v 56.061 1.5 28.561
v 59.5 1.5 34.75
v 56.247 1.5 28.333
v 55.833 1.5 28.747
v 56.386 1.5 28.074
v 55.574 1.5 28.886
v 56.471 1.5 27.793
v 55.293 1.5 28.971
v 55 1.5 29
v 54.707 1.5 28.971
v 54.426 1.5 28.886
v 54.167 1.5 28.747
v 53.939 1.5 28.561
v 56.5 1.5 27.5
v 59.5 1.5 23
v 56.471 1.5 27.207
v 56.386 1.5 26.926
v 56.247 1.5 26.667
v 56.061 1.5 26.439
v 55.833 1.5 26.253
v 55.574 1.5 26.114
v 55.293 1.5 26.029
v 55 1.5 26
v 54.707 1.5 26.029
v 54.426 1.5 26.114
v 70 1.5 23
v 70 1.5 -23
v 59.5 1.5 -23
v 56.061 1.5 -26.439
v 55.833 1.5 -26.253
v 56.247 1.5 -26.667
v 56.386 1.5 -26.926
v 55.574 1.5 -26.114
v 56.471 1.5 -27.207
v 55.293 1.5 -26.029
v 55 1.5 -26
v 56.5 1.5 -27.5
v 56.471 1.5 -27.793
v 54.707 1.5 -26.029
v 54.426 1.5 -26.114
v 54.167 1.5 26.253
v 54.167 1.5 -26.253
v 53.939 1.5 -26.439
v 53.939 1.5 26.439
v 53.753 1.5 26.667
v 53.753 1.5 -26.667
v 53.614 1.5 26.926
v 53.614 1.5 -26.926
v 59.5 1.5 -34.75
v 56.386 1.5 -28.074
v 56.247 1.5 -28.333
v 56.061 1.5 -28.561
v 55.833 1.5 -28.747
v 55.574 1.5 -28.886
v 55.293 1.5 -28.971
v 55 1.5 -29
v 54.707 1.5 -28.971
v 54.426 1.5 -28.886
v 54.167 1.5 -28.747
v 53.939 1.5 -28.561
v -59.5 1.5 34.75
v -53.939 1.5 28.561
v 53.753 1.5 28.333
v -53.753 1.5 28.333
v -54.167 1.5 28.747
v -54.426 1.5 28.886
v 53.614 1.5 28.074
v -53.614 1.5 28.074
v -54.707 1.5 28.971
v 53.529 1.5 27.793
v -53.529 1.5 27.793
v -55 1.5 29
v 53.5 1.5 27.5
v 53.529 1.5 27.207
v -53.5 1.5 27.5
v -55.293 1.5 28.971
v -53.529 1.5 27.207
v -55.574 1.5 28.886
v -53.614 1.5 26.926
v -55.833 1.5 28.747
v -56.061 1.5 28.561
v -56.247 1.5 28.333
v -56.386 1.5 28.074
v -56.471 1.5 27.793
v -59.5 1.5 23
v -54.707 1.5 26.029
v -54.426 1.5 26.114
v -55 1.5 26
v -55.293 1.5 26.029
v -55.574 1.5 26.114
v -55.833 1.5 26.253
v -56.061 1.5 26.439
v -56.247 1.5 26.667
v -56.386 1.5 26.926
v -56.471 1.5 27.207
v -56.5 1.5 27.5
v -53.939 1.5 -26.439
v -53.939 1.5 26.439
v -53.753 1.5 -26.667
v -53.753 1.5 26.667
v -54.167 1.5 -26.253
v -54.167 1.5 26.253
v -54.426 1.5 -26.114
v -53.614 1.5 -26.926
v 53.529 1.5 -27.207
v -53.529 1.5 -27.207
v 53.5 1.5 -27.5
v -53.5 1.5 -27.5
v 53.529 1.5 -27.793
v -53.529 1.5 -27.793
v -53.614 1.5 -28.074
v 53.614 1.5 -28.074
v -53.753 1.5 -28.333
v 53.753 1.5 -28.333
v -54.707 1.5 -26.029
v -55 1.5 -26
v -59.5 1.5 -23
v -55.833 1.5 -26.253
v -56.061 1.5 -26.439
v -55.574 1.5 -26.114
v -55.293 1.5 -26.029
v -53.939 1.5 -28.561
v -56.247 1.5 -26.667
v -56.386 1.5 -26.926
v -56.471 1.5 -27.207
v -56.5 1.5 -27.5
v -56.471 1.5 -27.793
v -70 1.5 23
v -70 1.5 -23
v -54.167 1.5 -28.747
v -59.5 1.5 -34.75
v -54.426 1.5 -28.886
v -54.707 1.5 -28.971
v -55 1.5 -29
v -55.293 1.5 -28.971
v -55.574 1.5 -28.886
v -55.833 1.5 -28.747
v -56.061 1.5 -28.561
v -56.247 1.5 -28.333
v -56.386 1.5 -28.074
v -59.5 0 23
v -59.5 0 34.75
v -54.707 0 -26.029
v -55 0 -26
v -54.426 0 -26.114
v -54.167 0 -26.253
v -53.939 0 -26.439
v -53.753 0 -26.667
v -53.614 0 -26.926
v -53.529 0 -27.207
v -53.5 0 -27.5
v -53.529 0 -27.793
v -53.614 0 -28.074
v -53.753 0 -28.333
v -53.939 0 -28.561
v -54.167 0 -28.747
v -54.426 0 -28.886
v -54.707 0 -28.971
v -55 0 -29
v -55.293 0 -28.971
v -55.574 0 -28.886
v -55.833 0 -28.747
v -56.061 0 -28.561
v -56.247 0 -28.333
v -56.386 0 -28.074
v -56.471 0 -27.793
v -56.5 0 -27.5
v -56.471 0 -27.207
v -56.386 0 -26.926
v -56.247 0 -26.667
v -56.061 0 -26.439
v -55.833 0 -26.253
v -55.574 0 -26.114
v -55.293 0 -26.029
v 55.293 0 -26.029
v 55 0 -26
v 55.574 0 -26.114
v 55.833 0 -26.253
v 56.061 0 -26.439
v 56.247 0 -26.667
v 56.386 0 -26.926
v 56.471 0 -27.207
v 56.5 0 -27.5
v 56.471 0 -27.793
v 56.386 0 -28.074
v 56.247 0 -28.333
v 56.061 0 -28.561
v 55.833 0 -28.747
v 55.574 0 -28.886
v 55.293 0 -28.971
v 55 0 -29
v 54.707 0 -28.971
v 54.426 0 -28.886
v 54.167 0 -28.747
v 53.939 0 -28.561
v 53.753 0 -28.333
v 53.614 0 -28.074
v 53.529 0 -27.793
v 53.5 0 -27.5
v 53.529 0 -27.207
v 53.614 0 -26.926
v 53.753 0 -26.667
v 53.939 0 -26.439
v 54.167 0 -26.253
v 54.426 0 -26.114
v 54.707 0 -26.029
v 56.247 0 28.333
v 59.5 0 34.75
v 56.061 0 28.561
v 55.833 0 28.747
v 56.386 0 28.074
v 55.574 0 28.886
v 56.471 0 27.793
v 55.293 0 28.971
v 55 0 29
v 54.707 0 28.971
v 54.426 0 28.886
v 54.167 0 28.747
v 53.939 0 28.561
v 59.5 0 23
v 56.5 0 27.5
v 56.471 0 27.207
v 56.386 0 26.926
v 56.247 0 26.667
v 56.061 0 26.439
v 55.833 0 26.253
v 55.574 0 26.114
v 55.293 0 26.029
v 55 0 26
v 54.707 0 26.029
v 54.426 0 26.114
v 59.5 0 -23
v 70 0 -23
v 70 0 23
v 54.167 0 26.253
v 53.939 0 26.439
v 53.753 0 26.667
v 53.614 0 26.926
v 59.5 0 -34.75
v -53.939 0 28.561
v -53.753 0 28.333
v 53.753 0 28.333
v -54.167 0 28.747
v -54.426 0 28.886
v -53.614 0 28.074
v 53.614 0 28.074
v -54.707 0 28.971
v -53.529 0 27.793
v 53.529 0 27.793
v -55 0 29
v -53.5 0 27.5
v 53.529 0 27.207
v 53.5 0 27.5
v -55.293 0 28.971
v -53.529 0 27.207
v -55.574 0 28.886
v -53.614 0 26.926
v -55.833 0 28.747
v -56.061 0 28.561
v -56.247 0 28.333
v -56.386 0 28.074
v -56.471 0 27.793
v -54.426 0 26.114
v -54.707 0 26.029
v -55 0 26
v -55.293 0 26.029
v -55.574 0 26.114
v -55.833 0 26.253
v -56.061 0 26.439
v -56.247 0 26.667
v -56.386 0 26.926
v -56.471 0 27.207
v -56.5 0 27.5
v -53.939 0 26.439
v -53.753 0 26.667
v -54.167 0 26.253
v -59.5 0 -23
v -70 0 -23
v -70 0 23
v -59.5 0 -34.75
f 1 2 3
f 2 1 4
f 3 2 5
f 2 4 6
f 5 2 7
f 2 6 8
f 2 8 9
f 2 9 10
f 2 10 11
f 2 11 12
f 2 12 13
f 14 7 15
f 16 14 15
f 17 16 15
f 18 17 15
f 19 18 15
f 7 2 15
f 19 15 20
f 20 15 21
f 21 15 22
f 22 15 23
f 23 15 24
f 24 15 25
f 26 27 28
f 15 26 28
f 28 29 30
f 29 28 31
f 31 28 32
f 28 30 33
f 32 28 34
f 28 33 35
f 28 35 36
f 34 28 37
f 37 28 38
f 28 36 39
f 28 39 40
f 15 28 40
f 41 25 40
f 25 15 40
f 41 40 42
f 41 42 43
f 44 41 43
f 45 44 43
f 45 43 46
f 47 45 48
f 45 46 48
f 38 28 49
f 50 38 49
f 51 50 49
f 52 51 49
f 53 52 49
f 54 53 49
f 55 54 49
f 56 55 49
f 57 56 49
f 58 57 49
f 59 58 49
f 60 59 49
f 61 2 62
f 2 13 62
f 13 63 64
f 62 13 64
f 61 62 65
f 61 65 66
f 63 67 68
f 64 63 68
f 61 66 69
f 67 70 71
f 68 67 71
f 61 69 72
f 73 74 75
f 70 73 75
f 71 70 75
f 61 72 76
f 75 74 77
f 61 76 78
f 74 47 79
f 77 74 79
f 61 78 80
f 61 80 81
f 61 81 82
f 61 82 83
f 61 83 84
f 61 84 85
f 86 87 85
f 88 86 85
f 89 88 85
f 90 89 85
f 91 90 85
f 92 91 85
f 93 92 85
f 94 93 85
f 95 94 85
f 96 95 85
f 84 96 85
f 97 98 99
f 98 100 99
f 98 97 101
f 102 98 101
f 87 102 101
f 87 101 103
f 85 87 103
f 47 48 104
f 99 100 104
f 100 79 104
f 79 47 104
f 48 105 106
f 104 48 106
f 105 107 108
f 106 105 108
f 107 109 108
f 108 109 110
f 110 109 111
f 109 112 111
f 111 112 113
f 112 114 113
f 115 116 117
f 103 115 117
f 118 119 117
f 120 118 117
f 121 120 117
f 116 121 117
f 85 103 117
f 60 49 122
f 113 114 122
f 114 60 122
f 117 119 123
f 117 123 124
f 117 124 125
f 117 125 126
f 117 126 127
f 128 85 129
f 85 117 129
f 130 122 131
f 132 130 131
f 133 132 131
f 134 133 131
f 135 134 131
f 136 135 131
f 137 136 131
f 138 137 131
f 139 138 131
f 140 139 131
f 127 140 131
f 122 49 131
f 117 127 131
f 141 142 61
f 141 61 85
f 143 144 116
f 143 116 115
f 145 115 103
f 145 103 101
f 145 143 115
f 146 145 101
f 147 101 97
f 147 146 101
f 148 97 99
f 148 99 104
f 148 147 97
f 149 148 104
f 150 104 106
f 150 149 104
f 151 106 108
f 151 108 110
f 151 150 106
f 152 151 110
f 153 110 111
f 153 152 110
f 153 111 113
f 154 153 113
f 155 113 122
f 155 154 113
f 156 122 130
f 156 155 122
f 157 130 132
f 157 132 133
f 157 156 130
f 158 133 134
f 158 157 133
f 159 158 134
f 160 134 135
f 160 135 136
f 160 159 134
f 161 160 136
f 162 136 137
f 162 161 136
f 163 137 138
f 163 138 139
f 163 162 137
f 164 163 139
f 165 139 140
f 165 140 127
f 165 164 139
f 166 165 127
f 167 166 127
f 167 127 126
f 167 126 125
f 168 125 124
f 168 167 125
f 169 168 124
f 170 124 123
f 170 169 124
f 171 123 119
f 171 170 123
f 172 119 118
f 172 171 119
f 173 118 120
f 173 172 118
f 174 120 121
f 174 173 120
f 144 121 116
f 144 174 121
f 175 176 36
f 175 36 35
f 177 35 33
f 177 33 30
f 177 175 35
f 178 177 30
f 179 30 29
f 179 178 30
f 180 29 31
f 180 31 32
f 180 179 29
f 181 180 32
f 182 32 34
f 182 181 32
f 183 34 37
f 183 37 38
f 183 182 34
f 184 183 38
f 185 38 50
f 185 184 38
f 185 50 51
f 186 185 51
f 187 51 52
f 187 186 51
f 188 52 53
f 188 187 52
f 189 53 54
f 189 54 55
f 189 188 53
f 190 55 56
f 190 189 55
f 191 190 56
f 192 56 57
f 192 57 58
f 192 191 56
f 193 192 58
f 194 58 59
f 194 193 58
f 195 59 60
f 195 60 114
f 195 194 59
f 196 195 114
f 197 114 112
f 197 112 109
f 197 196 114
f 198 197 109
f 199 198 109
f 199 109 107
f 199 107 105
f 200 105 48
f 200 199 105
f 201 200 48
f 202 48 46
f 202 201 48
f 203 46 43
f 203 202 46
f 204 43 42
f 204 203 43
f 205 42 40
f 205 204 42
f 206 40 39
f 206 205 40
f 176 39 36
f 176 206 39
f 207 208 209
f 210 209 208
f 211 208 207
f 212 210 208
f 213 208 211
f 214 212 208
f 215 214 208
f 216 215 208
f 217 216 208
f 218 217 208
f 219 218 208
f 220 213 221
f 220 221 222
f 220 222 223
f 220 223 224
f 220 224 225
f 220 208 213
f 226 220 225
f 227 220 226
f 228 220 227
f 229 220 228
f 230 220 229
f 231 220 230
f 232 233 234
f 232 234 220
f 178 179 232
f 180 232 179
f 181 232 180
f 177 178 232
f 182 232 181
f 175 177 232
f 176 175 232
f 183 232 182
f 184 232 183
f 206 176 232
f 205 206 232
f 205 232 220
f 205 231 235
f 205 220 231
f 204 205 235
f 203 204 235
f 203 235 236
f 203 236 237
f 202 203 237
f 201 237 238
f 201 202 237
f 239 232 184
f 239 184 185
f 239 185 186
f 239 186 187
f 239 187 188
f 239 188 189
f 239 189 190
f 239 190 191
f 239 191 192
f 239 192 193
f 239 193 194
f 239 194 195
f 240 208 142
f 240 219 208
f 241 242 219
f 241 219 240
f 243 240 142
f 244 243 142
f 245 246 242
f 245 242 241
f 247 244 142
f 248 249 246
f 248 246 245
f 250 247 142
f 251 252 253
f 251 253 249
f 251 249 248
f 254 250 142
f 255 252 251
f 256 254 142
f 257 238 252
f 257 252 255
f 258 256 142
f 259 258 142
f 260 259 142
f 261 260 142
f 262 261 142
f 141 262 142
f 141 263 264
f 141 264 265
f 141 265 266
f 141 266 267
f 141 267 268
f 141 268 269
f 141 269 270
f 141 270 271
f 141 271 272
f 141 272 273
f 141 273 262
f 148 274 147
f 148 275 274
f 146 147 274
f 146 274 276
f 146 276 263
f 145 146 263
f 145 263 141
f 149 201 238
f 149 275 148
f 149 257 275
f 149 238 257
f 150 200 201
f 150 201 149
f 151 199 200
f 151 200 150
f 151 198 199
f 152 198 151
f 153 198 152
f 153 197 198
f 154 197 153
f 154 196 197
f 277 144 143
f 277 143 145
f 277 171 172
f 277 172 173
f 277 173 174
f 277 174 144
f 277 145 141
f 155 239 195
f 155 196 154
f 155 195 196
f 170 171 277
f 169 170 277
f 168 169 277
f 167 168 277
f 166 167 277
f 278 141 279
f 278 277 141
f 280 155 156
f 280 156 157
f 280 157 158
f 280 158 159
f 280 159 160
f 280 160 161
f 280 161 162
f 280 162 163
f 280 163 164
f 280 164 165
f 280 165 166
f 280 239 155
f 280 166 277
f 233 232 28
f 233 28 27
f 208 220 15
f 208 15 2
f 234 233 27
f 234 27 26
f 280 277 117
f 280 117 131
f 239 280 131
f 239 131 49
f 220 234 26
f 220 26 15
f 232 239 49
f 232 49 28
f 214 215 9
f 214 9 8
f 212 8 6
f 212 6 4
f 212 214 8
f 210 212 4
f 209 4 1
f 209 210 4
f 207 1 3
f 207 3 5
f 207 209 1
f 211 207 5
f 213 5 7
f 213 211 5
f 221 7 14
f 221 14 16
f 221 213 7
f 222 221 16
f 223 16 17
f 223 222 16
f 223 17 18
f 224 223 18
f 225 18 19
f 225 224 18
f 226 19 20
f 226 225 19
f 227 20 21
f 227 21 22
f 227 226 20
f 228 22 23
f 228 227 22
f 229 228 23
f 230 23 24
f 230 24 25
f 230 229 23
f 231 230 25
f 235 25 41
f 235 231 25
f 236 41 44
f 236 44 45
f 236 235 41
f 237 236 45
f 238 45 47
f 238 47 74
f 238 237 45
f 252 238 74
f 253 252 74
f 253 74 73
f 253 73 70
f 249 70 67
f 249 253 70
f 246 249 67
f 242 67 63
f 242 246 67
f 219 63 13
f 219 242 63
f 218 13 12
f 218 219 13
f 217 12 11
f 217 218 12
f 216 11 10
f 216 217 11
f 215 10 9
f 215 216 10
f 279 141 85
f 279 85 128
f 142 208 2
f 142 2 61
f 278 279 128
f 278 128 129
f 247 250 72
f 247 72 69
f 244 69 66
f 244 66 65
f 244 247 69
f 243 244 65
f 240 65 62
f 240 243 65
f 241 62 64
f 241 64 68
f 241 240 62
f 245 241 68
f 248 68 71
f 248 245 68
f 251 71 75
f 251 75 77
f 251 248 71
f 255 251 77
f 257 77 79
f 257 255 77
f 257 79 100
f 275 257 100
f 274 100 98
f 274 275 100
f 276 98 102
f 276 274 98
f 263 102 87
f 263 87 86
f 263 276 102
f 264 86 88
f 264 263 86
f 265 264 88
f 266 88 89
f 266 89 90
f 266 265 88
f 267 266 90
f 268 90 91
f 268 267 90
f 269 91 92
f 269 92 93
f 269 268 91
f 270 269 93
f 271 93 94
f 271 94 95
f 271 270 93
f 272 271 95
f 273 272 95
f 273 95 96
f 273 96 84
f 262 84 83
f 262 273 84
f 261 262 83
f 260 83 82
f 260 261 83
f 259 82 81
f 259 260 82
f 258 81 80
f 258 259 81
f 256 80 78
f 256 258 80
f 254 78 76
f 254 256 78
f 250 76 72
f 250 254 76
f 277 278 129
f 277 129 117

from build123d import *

# Parameters (mm, degrees)
EXTRUDE_1_DEPTH     = 1.5
SKETCH_2_R          = 1.5
CUT_EXTRUDE_2_DEPTH = 1.5


with BuildPart() as part:
    # Эскиз1 → Бобышка-Вытянуть1 (new body)
    with BuildSketch(Plane(origin=(0, 0, 0), x_dir=(1, 0, 0), z_dir=(0, 1, 0))):
        Polygon((-59.5, 34.75), (59.5, 34.75), (59.5, 23), (70, 23), (70, -23), (59.5, -23), (59.5, -34.75), (-59.5, -34.75), (-59.5, -23), (-70, -23), (-70, 23), (-59.5, 23), align=None)
    extrude(amount=EXTRUDE_1_DEPTH)

    # Эскиз2 → Вырез-Вытянуть2 (cut)
    with BuildSketch(Plane(origin=(0, 0, 0), x_dir=(1, 0, 0), z_dir=(0, 1, 0))):
        with Locations(Location((-55, 27.5, 0), (0, 0, 270))):
            Circle(SKETCH_2_R)
        with Locations(Location((-55, -27.5, 0), (0, 0, 270))):
            Circle(SKETCH_2_R)
        with Locations(Location((55, -27.5, 0), (0, 0, 270))):
            Circle(SKETCH_2_R)
        with Locations(Location((55, 27.5, 0), (0, 0, 270))):
            Circle(SKETCH_2_R)
    extrude(amount=CUT_EXTRUDE_2_DEPTH, mode=Mode.SUBTRACT)


solid = part.part
